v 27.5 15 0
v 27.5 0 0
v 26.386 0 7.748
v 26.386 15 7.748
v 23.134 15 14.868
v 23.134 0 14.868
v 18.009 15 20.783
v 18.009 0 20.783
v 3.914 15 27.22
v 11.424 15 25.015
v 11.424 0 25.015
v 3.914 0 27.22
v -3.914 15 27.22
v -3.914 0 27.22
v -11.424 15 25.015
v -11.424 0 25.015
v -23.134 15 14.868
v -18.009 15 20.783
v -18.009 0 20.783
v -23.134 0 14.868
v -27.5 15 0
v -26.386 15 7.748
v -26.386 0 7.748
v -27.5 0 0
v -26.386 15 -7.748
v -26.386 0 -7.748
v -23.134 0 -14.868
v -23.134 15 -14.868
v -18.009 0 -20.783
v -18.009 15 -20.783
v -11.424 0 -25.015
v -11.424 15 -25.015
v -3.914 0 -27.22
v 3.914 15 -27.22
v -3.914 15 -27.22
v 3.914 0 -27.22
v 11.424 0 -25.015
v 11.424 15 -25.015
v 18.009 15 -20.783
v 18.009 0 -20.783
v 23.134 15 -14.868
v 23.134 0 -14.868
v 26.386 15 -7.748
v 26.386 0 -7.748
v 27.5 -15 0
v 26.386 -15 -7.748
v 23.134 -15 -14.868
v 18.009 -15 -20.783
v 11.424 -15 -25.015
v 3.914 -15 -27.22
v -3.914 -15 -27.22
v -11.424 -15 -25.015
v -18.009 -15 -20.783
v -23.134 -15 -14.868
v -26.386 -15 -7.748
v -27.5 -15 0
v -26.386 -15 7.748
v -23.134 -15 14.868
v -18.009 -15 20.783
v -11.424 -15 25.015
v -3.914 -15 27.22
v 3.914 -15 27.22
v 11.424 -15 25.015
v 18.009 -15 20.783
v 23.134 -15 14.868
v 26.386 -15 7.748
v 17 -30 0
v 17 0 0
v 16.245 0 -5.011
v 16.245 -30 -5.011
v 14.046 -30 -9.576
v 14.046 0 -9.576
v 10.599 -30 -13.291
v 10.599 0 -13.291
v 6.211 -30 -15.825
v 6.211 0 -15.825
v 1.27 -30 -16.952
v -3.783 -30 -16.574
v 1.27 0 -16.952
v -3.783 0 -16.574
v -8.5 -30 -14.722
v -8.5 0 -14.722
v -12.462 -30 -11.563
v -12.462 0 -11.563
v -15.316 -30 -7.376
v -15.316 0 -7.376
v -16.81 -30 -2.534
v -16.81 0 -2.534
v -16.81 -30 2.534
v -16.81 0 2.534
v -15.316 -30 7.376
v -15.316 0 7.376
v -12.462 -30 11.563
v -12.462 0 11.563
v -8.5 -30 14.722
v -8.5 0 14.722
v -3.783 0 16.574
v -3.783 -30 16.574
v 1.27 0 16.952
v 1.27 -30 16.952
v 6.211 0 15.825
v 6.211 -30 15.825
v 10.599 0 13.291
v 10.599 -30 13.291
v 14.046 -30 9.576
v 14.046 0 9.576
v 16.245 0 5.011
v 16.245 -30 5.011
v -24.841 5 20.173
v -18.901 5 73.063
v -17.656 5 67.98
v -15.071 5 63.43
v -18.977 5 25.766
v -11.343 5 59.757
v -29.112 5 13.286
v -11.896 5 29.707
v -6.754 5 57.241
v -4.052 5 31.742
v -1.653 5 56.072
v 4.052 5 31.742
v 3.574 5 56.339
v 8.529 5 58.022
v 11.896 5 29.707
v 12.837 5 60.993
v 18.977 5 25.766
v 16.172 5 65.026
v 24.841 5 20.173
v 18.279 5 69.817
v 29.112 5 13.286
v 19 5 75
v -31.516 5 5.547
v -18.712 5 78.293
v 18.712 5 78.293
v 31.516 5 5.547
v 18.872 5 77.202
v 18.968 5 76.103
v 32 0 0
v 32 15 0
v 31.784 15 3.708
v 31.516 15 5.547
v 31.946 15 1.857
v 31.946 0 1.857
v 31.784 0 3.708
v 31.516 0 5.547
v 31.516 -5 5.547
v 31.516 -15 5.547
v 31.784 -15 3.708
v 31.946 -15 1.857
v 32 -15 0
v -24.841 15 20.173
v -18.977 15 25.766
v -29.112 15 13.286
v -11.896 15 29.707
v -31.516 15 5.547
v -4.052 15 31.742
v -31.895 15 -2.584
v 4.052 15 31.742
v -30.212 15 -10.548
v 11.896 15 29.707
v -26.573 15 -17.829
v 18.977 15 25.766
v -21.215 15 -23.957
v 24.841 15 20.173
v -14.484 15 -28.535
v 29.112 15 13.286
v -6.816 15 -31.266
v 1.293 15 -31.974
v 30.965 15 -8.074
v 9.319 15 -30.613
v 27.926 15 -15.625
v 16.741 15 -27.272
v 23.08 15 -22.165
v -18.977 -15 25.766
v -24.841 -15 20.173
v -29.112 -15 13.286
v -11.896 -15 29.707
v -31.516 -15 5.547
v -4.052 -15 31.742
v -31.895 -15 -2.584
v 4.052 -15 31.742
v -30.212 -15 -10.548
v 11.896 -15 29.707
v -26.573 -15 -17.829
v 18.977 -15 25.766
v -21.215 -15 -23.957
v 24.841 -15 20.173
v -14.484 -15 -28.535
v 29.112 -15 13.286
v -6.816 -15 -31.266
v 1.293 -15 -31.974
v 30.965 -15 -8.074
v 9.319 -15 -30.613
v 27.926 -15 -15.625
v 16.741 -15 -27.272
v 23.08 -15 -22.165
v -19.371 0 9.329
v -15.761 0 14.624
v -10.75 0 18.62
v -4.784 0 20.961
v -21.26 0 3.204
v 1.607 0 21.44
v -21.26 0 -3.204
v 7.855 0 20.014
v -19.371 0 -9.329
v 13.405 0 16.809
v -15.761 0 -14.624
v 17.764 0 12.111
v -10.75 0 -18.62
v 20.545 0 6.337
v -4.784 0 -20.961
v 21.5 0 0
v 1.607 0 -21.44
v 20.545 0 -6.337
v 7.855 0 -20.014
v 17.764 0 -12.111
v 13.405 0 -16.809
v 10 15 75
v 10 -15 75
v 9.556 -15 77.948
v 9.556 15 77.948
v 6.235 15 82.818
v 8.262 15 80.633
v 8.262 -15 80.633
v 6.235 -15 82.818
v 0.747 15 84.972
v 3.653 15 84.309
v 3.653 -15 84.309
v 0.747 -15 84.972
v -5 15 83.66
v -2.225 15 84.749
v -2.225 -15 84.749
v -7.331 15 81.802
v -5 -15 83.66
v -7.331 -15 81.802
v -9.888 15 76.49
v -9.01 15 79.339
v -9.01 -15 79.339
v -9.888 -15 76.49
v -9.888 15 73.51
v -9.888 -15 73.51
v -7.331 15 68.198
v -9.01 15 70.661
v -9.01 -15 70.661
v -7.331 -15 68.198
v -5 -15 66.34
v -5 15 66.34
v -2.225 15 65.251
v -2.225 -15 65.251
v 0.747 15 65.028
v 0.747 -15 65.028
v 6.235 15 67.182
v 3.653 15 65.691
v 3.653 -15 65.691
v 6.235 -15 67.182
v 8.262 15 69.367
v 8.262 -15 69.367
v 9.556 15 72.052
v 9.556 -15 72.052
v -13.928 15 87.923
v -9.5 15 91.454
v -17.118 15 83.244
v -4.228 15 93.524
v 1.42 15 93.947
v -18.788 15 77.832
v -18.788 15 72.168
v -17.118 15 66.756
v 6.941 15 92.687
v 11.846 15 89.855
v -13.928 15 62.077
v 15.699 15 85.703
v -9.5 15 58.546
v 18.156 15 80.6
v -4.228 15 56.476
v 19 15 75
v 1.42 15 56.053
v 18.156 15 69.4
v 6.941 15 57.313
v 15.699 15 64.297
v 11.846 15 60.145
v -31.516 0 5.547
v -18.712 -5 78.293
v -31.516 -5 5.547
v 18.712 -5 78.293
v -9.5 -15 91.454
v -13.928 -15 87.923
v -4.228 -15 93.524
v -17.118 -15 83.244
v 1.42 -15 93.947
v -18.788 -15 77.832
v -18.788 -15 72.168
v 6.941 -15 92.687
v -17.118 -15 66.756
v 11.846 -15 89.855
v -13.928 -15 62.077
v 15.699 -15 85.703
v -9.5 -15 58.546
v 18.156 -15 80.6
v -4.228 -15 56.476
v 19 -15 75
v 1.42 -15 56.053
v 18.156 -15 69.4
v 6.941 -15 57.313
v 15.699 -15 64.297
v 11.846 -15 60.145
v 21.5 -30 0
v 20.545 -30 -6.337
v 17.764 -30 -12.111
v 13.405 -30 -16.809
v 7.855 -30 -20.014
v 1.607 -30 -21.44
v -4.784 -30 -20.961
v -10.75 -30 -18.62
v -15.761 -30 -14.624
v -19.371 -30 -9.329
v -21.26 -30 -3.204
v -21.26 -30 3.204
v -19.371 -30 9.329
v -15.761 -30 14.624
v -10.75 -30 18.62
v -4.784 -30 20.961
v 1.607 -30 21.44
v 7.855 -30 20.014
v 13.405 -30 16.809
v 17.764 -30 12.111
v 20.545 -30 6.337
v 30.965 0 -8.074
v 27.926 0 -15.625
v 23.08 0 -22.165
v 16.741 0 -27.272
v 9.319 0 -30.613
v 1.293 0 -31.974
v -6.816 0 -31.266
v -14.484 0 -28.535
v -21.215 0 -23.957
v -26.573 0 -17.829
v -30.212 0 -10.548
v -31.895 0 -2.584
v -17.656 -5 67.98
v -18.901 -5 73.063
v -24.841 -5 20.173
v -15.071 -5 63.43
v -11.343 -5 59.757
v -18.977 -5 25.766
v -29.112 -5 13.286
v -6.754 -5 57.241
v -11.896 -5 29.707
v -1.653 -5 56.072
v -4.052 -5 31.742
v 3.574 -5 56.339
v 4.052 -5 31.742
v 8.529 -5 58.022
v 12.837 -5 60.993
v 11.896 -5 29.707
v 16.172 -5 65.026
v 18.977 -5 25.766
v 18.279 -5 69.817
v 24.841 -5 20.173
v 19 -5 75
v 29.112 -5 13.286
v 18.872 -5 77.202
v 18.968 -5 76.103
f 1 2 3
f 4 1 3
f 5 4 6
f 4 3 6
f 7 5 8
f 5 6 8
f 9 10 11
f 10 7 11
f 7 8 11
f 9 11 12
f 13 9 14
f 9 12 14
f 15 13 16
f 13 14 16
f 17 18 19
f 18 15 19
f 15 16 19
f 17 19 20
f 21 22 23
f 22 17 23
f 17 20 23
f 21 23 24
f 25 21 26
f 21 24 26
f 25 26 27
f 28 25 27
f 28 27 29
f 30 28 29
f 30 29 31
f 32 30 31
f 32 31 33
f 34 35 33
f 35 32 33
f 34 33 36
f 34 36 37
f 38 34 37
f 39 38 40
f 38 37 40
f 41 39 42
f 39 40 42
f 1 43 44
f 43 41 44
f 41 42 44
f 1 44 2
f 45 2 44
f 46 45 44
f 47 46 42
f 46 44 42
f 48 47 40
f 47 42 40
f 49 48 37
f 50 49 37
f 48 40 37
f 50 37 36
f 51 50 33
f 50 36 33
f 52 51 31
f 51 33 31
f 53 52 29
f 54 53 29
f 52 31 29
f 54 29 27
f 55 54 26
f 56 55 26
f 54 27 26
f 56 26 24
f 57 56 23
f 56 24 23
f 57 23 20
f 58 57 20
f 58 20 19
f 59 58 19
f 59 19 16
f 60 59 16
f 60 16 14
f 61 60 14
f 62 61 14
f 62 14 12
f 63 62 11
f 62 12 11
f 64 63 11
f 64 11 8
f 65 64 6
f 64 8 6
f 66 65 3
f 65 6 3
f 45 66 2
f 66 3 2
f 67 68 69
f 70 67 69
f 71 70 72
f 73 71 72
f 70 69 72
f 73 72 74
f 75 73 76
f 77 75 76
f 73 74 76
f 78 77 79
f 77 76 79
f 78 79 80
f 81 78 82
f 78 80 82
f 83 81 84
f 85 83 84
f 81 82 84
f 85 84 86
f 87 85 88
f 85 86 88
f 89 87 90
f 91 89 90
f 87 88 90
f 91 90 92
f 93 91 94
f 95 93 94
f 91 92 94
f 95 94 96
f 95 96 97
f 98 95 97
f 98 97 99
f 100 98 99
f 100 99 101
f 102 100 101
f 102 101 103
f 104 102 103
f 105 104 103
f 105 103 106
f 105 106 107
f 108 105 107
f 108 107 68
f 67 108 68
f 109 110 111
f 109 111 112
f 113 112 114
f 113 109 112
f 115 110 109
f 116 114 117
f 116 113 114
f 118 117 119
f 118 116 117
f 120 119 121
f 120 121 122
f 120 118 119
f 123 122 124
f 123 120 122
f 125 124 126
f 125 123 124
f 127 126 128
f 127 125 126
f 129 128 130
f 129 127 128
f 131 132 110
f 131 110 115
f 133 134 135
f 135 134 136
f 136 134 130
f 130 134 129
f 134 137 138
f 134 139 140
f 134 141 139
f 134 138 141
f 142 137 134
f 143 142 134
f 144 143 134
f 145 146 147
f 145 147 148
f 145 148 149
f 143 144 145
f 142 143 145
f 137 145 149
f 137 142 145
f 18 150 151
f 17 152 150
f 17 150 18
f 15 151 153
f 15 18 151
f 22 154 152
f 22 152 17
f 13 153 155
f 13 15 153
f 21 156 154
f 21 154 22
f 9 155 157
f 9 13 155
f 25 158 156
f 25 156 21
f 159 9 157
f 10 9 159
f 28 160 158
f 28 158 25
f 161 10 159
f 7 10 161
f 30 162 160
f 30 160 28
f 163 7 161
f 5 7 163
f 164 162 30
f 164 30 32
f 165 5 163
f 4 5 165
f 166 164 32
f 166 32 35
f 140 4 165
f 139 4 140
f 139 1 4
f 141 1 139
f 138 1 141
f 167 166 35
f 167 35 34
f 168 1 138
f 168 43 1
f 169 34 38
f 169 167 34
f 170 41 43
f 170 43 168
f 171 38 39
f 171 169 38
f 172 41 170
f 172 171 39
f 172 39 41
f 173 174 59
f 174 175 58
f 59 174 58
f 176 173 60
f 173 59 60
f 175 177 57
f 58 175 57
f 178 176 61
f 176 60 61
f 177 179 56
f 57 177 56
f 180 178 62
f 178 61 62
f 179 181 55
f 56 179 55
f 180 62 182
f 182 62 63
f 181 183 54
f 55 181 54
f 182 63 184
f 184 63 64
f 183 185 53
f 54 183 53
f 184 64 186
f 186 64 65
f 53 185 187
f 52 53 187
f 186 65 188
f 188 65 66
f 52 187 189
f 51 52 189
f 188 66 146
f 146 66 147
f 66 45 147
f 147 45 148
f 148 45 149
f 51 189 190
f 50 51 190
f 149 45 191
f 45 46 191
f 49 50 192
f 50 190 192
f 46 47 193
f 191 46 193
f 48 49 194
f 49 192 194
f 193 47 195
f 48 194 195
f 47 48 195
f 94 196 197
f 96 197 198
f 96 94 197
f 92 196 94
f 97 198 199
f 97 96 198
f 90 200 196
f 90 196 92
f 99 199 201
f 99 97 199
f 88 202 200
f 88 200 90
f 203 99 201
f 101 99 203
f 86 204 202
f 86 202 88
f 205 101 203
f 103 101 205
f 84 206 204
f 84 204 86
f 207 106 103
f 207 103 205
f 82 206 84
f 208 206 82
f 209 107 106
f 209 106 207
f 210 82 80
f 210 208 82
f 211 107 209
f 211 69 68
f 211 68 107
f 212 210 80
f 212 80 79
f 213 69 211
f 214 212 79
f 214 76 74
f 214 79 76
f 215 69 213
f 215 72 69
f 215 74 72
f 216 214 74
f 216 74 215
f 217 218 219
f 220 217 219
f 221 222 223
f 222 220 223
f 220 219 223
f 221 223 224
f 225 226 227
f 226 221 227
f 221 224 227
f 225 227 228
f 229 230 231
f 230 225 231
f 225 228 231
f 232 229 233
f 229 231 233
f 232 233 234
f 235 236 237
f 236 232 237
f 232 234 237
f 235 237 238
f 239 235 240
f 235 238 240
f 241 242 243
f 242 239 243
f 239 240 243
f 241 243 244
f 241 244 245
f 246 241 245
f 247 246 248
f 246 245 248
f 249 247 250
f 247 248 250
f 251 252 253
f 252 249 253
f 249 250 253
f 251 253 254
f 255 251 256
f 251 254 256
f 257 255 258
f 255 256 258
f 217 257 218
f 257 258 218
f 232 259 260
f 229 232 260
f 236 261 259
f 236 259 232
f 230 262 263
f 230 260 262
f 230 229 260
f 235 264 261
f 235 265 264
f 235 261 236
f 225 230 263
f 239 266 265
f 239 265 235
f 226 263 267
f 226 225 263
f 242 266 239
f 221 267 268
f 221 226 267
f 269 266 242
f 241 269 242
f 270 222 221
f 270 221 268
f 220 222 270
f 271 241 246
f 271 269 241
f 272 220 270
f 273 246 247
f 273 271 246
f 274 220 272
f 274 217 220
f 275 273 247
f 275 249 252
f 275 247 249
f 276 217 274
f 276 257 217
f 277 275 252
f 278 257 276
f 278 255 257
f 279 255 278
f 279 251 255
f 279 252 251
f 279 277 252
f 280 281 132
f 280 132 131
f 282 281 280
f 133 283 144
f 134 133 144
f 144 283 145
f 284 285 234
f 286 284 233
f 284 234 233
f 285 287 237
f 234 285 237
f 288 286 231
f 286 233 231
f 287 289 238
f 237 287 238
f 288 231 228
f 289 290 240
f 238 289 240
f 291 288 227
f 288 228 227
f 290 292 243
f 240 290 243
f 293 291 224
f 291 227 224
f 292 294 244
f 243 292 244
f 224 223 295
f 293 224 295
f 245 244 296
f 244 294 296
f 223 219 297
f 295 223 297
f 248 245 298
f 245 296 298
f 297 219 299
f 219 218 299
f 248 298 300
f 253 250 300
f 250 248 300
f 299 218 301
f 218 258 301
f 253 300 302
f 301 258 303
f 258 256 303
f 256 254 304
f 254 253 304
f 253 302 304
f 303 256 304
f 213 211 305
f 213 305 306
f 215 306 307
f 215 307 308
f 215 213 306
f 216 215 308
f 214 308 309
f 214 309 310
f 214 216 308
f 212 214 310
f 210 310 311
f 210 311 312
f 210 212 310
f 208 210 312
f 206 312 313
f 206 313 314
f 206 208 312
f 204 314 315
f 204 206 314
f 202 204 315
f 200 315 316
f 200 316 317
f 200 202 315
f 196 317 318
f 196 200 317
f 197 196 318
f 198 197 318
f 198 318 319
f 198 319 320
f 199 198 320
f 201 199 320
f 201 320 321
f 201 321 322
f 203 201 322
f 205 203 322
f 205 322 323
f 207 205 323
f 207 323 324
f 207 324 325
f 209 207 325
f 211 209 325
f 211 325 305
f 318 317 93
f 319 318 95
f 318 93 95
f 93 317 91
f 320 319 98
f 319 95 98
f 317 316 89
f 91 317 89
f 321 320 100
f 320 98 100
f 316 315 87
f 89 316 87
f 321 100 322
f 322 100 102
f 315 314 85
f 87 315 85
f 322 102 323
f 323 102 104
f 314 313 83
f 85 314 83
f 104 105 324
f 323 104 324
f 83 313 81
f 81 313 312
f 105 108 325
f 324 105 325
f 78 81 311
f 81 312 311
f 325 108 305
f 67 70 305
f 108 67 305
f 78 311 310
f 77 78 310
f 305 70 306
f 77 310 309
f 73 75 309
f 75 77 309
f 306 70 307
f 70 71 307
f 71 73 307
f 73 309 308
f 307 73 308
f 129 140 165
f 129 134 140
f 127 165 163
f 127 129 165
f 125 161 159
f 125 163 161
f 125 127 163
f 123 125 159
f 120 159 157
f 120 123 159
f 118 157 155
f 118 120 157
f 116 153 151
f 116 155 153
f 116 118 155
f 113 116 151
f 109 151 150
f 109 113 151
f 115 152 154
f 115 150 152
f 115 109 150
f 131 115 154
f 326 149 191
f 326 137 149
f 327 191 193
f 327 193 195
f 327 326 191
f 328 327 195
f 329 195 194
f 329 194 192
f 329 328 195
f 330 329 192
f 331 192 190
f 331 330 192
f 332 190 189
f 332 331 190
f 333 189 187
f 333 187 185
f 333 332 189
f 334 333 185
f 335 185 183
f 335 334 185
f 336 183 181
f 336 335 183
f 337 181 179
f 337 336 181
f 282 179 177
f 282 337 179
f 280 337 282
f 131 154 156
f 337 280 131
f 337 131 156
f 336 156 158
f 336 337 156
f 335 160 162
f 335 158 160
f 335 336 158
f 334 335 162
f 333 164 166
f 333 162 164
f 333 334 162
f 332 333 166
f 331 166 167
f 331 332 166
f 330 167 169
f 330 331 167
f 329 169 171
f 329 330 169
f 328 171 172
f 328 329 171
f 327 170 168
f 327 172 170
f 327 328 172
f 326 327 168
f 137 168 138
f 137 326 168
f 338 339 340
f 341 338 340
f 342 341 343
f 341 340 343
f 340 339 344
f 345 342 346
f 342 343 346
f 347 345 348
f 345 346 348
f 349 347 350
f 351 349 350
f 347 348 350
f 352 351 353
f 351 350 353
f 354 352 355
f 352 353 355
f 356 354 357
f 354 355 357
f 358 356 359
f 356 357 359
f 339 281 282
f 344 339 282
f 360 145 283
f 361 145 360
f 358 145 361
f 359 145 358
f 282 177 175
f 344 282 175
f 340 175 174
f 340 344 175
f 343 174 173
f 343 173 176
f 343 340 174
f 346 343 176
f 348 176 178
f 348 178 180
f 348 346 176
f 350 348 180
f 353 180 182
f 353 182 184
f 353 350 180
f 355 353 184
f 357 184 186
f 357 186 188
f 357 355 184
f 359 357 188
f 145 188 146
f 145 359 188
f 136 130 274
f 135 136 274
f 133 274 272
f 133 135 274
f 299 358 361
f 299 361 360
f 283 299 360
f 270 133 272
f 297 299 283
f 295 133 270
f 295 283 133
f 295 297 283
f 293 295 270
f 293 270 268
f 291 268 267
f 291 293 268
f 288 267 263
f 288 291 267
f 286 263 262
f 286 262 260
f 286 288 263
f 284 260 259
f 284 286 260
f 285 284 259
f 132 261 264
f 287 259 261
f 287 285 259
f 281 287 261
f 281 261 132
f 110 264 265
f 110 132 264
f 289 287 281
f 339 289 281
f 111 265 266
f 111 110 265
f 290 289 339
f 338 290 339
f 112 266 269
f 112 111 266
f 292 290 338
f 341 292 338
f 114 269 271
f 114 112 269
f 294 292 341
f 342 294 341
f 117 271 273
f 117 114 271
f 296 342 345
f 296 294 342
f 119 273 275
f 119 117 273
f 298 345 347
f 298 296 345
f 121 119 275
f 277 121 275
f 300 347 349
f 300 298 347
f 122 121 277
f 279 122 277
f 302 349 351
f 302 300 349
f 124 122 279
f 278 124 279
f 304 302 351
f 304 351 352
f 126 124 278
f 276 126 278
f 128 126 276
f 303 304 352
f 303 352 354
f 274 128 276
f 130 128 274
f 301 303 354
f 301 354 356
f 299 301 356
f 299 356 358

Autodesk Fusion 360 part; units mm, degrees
sketch "Sketch1" plane through (0, 0, 0) normal (0, 1, 0) x (1, 0, 0)
  circle A0 centre (0, 0) radius 17
  circle A1 centre (0, 0) radius 21.5
  circle A2 centre (0, 0) radius 27.5
  circle A3 centre (0, 0) radius 32
  circle A4 centre (0, -75) radius 10
  circle A5 centre (0, -75) radius 19
  line L0 (-18.7124, -78.2933) -> (-31.5156, -5.5467)
  line L1 (18.7124, -78.2933) -> (31.5156, -5.5467)
  dimension "d1" = 34
  dimension "d2" = 43
  dimension "d3" = 55
  dimension "d4" = 64
  dimension "d5" = 20
  dimension "d6" = 38
  dimension "d7" = 75
extrude "Extrude1" add sketch "Sketch1" along normal mid plane 30 contours A5 makes body 1
extrude "Extrude2" add sketch "Sketch1" against normal blind 30 separate body contours A1 makes body 2
extrude "Extrude3" add sketch "Sketch1" along normal mid plane 30 separate body contours A3 makes body 3
extrude "Extrude4" add sketch "Sketch1" along normal mid plane 10 contours A3 A5 L0 L1 bodies 1 3
